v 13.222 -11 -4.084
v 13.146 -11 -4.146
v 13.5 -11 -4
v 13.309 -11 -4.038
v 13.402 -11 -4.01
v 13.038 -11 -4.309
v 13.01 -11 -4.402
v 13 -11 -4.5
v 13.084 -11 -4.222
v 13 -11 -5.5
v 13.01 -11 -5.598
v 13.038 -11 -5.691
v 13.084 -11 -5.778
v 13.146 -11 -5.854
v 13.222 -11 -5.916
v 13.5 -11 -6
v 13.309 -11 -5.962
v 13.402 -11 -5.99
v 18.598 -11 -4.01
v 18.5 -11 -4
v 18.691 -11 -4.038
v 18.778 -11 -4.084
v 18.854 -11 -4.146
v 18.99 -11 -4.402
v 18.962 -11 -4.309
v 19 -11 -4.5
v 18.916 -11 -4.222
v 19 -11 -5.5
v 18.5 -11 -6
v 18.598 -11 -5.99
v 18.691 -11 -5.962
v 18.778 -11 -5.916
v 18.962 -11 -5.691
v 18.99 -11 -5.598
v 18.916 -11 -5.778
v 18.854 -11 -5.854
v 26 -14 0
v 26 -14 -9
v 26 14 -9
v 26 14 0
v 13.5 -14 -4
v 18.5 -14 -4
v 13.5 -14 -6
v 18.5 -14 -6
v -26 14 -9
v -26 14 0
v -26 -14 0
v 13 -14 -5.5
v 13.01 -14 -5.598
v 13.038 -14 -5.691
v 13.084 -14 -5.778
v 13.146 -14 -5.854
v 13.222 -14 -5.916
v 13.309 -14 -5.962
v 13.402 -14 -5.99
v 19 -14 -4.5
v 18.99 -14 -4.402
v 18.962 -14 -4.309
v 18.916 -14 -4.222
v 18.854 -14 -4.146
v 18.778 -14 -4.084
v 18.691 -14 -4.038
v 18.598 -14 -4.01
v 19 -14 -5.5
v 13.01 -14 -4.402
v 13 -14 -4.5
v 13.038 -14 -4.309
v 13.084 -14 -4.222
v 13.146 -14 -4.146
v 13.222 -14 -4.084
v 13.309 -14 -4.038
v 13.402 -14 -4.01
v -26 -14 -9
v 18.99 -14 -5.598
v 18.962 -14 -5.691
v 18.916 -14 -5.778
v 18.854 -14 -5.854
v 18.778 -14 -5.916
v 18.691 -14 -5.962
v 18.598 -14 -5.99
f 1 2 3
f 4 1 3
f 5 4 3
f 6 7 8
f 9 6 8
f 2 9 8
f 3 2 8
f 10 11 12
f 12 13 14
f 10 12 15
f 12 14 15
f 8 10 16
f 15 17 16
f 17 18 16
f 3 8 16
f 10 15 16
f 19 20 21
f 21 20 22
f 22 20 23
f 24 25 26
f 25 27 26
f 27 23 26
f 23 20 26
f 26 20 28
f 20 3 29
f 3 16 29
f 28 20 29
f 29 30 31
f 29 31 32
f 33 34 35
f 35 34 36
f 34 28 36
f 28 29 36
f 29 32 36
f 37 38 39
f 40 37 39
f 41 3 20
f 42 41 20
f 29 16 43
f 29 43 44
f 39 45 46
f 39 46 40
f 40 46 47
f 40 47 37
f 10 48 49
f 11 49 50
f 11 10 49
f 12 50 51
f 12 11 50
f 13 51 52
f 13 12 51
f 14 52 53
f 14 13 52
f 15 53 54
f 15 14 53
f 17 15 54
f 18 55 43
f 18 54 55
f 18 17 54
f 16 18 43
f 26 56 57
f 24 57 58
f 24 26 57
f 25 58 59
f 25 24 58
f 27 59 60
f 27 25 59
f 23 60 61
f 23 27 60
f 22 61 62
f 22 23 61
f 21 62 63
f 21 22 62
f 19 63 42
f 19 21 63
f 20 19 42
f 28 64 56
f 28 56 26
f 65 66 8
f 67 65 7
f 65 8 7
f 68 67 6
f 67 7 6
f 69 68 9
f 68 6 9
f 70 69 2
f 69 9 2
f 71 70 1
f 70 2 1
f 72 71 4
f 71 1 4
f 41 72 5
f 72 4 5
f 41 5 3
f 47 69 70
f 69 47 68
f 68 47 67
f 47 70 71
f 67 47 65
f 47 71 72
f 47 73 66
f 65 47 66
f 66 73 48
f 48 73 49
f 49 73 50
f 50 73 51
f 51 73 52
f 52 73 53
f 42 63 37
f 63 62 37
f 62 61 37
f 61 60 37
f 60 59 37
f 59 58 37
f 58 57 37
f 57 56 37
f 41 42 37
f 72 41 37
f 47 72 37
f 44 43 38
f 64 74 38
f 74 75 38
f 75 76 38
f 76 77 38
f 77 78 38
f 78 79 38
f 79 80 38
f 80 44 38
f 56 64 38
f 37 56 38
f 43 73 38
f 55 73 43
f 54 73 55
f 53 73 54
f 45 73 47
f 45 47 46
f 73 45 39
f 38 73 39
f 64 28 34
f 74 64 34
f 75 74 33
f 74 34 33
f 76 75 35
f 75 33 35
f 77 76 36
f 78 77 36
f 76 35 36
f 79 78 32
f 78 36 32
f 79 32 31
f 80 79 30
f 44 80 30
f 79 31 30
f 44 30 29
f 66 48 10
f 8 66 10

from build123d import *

# Parameters (mm, degrees)
BOX003_W     = 6
BOX003_H     = 6
BOX003_DEPTH = 2
FILLET002_R  = 0.5
BOX_W        = 52
BOX_H        = 28
BOX_DEPTH    = 9


with BuildPart() as fillet002:
    # Box003 → Box003 (new body)
    with BuildSketch(Plane(origin=(13, -17, -6), x_dir=(1, 0, 0), z_dir=(0, 0, 1))):
        with Locations((3, 3)):
            Rectangle(BOX003_W, BOX003_H)
    extrude(amount=BOX003_DEPTH)

    # Fillet002
    fillet002_edges = [fillet002.edges().sort_by_distance(p)[0] for p in [
        (13, -14, -4),
        (13, -14, -6),
        (19, -14, -4),
        (19, -14, -6),
    ]]
    fillet(fillet002_edges, radius=FILLET002_R)


with BuildPart() as korp:
    # Box → Box (new body)
    with BuildSketch(Plane(origin=(-26, -14, -9), x_dir=(1, 0, 0), z_dir=(0, 0, 1))):
        with Locations((26, 14)):
            Rectangle(BOX_W, BOX_H)
    extrude(amount=BOX_DEPTH)

    # Cut: cut Fillet002
    add(fillet002.part, mode=Mode.SUBTRACT)


solid = korp.part
